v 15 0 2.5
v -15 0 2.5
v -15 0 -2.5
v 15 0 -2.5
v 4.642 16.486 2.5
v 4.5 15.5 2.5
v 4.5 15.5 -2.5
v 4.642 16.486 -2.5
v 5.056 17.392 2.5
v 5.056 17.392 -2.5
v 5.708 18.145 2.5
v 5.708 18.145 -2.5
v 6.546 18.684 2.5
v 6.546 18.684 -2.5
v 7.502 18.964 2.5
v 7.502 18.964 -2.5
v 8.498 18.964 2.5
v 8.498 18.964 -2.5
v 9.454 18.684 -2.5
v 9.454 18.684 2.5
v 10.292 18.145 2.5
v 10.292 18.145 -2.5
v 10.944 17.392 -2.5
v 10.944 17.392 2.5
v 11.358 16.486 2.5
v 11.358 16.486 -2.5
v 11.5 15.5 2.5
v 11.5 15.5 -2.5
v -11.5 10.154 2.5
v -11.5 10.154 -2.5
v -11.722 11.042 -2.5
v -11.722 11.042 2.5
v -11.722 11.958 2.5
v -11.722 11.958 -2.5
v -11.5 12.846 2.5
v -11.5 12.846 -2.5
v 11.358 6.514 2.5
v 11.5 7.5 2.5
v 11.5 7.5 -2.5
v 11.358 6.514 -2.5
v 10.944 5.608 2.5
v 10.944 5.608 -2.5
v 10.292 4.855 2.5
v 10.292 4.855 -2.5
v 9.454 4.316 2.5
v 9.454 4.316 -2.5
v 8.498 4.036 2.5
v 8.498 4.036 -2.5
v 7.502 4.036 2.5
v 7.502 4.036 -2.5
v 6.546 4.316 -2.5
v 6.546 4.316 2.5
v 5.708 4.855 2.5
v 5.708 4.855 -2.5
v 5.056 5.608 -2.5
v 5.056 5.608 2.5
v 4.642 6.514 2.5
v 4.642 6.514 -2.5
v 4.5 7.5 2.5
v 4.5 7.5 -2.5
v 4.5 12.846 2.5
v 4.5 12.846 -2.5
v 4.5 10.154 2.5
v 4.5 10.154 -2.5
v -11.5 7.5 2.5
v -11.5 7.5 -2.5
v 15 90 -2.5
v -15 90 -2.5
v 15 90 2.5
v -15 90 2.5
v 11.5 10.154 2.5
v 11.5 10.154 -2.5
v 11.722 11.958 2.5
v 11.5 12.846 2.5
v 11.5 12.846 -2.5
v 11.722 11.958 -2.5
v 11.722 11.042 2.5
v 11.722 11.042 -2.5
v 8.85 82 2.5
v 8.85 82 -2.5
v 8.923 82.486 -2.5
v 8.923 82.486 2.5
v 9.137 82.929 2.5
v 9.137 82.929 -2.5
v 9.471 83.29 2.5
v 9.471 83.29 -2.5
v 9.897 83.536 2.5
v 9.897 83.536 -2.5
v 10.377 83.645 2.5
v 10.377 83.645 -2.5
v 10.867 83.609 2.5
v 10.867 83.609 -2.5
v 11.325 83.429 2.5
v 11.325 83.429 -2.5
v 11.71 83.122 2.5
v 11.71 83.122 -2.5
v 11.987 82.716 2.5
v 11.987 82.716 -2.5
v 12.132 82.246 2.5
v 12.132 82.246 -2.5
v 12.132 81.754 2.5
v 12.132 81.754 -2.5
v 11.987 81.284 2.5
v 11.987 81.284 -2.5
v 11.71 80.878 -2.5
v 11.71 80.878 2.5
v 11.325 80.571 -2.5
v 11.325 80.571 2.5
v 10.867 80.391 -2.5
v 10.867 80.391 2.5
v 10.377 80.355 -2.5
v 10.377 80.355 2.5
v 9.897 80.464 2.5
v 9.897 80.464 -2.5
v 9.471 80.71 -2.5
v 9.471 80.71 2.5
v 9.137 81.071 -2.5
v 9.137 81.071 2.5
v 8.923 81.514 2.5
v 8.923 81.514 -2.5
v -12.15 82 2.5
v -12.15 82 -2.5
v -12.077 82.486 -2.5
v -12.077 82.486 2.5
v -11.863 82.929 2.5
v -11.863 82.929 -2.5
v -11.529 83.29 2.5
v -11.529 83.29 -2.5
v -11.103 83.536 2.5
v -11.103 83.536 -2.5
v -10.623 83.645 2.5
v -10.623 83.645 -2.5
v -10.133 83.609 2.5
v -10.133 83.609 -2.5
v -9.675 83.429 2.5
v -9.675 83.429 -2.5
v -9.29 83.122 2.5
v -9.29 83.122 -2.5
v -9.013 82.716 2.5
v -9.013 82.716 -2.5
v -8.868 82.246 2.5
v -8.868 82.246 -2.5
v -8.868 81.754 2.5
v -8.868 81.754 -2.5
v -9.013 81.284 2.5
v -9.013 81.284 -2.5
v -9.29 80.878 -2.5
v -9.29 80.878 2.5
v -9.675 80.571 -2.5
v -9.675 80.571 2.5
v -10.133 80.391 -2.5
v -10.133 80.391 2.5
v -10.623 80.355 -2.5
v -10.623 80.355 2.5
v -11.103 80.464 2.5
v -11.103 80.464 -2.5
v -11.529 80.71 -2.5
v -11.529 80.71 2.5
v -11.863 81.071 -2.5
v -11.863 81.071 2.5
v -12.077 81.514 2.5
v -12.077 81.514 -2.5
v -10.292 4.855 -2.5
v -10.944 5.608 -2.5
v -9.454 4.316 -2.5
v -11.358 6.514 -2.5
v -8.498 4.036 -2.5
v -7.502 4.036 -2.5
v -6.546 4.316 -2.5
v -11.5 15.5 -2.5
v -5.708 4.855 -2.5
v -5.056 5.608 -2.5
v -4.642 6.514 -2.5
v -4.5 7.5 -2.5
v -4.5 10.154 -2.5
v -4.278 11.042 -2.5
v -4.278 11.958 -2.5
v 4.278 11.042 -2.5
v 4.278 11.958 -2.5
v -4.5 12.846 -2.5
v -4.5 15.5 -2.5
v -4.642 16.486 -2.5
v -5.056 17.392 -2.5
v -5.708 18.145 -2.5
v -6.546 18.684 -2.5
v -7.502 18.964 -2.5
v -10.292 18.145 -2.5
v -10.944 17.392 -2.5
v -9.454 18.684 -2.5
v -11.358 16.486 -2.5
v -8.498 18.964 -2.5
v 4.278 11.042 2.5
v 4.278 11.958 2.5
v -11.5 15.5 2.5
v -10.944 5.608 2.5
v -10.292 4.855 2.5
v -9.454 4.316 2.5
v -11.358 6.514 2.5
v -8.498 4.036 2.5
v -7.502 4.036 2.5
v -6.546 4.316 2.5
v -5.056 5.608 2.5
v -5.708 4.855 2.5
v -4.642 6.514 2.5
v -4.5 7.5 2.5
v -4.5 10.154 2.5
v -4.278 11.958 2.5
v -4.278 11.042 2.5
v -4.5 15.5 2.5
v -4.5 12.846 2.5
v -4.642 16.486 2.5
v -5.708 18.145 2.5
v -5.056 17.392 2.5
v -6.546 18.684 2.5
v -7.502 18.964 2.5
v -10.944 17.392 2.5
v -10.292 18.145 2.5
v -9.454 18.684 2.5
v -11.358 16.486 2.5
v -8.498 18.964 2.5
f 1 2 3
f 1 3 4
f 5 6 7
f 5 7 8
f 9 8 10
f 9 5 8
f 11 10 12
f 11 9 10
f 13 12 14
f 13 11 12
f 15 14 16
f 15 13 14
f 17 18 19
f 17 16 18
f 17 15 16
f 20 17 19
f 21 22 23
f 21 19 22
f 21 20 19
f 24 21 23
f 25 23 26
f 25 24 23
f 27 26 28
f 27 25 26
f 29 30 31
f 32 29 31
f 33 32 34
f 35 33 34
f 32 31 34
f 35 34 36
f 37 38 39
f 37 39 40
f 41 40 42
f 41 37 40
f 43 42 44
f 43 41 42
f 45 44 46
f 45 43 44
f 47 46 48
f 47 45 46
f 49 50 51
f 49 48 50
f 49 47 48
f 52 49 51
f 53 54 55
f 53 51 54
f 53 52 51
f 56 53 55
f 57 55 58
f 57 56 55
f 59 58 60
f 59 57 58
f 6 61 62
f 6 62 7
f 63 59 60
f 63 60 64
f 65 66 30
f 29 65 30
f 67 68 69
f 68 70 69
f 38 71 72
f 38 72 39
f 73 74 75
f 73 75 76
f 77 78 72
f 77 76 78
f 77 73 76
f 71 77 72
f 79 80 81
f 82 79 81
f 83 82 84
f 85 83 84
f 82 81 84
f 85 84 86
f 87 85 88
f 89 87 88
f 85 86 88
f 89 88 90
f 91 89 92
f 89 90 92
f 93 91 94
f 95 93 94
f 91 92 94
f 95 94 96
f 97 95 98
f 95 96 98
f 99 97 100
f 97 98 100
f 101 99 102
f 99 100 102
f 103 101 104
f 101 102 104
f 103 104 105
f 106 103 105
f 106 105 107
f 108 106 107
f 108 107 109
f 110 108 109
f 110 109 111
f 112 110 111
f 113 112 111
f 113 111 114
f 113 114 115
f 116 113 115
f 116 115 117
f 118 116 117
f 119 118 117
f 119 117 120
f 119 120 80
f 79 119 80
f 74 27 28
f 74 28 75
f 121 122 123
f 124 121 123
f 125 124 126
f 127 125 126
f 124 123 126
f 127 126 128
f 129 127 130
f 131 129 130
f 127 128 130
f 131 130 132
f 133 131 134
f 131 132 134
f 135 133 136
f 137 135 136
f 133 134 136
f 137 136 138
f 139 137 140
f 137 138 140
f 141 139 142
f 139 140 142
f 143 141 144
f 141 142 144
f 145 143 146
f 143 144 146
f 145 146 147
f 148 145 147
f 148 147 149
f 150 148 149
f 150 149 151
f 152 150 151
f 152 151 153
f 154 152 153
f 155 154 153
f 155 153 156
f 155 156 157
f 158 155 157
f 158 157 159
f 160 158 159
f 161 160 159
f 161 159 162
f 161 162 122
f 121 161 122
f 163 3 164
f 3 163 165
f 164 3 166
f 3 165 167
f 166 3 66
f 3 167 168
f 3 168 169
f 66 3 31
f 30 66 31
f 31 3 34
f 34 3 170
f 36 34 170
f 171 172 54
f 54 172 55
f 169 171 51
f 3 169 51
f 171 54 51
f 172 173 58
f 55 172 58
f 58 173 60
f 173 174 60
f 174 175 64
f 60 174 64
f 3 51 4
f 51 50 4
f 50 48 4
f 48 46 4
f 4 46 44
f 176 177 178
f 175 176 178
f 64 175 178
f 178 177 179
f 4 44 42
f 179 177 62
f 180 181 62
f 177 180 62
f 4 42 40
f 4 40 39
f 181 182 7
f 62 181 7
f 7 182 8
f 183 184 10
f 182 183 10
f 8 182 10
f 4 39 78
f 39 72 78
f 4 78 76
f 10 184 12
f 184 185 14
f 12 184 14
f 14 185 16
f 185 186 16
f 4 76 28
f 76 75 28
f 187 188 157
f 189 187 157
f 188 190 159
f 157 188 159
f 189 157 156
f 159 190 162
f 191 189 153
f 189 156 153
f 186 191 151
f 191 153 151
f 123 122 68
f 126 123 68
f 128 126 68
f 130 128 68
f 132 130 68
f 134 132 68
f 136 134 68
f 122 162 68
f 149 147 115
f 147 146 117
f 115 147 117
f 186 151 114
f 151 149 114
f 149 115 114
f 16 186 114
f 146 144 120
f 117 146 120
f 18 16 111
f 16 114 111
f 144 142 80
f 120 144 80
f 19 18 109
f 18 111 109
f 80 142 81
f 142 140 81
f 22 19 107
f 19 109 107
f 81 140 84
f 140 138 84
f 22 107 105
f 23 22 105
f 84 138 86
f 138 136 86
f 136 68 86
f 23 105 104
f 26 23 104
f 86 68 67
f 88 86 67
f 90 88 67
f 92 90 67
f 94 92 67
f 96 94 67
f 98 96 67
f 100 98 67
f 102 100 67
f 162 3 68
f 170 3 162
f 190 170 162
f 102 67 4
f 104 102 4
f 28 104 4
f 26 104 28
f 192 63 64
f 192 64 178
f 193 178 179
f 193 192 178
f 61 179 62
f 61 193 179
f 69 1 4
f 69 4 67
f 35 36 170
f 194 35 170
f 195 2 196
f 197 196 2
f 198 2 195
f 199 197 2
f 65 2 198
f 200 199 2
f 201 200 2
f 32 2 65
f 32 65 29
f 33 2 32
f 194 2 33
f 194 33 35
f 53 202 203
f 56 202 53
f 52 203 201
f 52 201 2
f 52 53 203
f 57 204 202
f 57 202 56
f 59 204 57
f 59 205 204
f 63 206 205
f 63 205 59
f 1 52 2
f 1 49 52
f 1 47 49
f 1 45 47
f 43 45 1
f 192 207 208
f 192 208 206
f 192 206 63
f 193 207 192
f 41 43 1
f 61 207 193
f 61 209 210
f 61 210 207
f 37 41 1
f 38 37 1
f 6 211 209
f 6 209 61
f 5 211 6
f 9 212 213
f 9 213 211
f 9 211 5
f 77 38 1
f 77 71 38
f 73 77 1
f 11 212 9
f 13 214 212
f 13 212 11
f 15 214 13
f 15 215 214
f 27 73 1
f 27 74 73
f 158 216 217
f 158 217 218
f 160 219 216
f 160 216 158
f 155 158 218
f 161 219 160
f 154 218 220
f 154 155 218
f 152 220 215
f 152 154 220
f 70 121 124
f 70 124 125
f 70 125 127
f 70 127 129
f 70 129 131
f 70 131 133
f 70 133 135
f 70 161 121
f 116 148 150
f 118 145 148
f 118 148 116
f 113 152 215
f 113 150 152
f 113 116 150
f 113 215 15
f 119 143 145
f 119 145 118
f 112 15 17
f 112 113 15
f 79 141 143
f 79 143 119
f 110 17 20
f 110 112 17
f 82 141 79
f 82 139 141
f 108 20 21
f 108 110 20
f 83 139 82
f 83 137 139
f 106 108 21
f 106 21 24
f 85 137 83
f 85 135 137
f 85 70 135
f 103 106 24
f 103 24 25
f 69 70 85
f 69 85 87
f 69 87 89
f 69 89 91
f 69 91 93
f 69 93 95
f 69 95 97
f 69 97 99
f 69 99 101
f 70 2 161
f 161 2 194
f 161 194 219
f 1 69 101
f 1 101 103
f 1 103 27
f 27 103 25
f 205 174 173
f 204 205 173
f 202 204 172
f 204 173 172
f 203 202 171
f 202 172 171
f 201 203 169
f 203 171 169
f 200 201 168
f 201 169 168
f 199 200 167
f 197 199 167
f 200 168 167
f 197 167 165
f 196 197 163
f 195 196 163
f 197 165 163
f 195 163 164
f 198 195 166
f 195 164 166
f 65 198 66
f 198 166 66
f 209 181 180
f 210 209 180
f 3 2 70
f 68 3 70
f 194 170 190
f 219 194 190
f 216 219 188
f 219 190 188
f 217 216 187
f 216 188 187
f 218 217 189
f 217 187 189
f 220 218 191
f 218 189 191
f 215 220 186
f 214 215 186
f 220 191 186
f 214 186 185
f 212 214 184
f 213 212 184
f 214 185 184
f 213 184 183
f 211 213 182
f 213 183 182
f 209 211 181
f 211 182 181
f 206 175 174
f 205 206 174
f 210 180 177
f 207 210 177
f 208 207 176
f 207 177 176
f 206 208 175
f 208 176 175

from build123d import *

# Parameters (mm, degrees)
SKIZZE2_W                       = 30
SKIZZE2_H                       = 90
AUFSATZ_LINEAR_AUSTRAGEN2_DEPTH = 2.5
SCHNITT_LINEAR_AUSTRAGEN1_DEPTH = 5
M4_GEWINDEBOHRUNG1_D            = 3.3
M4_GEWINDEBOHRUNG1_DEPTH        = 11.5
M4_GEWINDEBOHRUNG1_TIP          = 0.991420021


with BuildPart() as part:
    # Skizze2 → Aufsatz-Linear austragen2 (new, symmetric)
    with BuildSketch(Plane.XY):
        with Locations((0, 45)):
            Rectangle(SKIZZE2_W, SKIZZE2_H)
    extrude(amount=AUFSATZ_LINEAR_AUSTRAGEN2_DEPTH, both=True)

    # Skizze1 → Schnitt-Linear austragen1 (cut, symmetric)
    with BuildSketch(Plane.XY):
        with BuildLine():
            Line((-11.5, 12.846291202), (-11.5, 15.5))
            ThreePointArc((-11.5, 15.5), (-8, 19), (-4.5, 15.5))
            Line((-4.5, 15.5), (-4.5, 12.846291202))
            ThreePointArc((-4.5, 12.846291202), (-4.25, 11.5), (-4.5, 10.153708798))
            Line((-4.5, 10.153708798), (-4.5, 7.5))
            ThreePointArc((-4.5, 7.5), (-8, 4), (-11.5, 7.5))
            Line((-11.5, 7.5), (-11.5, 10.153708798))
            ThreePointArc((-11.5, 10.153708798), (-11.75, 11.5), (-11.5, 12.846291202))
        make_face()
        with BuildLine():
            Line((4.5, 12.846291202), (4.5, 15.5))
            ThreePointArc((4.5, 15.5), (8, 19), (11.5, 15.5))
            Line((11.5, 15.5), (11.5, 12.846291202))
            ThreePointArc((11.5, 12.846291202), (11.75, 11.5), (11.5, 10.153708798))
            Line((11.5, 10.153708798), (11.5, 7.5))
            ThreePointArc((11.5, 7.5), (8, 4), (4.5, 7.5))
            Line((4.5, 7.5), (4.5, 10.153708798))
            ThreePointArc((4.5, 10.153708798), (4.25, 11.5), (4.5, 12.846291202))
        make_face()
    extrude(amount=SCHNITT_LINEAR_AUSTRAGEN1_DEPTH, both=True, mode=Mode.SUBTRACT)

    # M4 Gewindebohrung1
    with Locations(Plane.XY.offset(2.5)):
        with Locations((-10.5, 82), (10.5, 82)):
            Hole(M4_GEWINDEBOHRUNG1_D / 2, depth=M4_GEWINDEBOHRUNG1_DEPTH)
            with Locations((0, 0, -(M4_GEWINDEBOHRUNG1_DEPTH + M4_GEWINDEBOHRUNG1_TIP / 2))):  # 118° drill point
                Cone(0, M4_GEWINDEBOHRUNG1_D / 2, M4_GEWINDEBOHRUNG1_TIP, mode=Mode.SUBTRACT)


solid = part.part
